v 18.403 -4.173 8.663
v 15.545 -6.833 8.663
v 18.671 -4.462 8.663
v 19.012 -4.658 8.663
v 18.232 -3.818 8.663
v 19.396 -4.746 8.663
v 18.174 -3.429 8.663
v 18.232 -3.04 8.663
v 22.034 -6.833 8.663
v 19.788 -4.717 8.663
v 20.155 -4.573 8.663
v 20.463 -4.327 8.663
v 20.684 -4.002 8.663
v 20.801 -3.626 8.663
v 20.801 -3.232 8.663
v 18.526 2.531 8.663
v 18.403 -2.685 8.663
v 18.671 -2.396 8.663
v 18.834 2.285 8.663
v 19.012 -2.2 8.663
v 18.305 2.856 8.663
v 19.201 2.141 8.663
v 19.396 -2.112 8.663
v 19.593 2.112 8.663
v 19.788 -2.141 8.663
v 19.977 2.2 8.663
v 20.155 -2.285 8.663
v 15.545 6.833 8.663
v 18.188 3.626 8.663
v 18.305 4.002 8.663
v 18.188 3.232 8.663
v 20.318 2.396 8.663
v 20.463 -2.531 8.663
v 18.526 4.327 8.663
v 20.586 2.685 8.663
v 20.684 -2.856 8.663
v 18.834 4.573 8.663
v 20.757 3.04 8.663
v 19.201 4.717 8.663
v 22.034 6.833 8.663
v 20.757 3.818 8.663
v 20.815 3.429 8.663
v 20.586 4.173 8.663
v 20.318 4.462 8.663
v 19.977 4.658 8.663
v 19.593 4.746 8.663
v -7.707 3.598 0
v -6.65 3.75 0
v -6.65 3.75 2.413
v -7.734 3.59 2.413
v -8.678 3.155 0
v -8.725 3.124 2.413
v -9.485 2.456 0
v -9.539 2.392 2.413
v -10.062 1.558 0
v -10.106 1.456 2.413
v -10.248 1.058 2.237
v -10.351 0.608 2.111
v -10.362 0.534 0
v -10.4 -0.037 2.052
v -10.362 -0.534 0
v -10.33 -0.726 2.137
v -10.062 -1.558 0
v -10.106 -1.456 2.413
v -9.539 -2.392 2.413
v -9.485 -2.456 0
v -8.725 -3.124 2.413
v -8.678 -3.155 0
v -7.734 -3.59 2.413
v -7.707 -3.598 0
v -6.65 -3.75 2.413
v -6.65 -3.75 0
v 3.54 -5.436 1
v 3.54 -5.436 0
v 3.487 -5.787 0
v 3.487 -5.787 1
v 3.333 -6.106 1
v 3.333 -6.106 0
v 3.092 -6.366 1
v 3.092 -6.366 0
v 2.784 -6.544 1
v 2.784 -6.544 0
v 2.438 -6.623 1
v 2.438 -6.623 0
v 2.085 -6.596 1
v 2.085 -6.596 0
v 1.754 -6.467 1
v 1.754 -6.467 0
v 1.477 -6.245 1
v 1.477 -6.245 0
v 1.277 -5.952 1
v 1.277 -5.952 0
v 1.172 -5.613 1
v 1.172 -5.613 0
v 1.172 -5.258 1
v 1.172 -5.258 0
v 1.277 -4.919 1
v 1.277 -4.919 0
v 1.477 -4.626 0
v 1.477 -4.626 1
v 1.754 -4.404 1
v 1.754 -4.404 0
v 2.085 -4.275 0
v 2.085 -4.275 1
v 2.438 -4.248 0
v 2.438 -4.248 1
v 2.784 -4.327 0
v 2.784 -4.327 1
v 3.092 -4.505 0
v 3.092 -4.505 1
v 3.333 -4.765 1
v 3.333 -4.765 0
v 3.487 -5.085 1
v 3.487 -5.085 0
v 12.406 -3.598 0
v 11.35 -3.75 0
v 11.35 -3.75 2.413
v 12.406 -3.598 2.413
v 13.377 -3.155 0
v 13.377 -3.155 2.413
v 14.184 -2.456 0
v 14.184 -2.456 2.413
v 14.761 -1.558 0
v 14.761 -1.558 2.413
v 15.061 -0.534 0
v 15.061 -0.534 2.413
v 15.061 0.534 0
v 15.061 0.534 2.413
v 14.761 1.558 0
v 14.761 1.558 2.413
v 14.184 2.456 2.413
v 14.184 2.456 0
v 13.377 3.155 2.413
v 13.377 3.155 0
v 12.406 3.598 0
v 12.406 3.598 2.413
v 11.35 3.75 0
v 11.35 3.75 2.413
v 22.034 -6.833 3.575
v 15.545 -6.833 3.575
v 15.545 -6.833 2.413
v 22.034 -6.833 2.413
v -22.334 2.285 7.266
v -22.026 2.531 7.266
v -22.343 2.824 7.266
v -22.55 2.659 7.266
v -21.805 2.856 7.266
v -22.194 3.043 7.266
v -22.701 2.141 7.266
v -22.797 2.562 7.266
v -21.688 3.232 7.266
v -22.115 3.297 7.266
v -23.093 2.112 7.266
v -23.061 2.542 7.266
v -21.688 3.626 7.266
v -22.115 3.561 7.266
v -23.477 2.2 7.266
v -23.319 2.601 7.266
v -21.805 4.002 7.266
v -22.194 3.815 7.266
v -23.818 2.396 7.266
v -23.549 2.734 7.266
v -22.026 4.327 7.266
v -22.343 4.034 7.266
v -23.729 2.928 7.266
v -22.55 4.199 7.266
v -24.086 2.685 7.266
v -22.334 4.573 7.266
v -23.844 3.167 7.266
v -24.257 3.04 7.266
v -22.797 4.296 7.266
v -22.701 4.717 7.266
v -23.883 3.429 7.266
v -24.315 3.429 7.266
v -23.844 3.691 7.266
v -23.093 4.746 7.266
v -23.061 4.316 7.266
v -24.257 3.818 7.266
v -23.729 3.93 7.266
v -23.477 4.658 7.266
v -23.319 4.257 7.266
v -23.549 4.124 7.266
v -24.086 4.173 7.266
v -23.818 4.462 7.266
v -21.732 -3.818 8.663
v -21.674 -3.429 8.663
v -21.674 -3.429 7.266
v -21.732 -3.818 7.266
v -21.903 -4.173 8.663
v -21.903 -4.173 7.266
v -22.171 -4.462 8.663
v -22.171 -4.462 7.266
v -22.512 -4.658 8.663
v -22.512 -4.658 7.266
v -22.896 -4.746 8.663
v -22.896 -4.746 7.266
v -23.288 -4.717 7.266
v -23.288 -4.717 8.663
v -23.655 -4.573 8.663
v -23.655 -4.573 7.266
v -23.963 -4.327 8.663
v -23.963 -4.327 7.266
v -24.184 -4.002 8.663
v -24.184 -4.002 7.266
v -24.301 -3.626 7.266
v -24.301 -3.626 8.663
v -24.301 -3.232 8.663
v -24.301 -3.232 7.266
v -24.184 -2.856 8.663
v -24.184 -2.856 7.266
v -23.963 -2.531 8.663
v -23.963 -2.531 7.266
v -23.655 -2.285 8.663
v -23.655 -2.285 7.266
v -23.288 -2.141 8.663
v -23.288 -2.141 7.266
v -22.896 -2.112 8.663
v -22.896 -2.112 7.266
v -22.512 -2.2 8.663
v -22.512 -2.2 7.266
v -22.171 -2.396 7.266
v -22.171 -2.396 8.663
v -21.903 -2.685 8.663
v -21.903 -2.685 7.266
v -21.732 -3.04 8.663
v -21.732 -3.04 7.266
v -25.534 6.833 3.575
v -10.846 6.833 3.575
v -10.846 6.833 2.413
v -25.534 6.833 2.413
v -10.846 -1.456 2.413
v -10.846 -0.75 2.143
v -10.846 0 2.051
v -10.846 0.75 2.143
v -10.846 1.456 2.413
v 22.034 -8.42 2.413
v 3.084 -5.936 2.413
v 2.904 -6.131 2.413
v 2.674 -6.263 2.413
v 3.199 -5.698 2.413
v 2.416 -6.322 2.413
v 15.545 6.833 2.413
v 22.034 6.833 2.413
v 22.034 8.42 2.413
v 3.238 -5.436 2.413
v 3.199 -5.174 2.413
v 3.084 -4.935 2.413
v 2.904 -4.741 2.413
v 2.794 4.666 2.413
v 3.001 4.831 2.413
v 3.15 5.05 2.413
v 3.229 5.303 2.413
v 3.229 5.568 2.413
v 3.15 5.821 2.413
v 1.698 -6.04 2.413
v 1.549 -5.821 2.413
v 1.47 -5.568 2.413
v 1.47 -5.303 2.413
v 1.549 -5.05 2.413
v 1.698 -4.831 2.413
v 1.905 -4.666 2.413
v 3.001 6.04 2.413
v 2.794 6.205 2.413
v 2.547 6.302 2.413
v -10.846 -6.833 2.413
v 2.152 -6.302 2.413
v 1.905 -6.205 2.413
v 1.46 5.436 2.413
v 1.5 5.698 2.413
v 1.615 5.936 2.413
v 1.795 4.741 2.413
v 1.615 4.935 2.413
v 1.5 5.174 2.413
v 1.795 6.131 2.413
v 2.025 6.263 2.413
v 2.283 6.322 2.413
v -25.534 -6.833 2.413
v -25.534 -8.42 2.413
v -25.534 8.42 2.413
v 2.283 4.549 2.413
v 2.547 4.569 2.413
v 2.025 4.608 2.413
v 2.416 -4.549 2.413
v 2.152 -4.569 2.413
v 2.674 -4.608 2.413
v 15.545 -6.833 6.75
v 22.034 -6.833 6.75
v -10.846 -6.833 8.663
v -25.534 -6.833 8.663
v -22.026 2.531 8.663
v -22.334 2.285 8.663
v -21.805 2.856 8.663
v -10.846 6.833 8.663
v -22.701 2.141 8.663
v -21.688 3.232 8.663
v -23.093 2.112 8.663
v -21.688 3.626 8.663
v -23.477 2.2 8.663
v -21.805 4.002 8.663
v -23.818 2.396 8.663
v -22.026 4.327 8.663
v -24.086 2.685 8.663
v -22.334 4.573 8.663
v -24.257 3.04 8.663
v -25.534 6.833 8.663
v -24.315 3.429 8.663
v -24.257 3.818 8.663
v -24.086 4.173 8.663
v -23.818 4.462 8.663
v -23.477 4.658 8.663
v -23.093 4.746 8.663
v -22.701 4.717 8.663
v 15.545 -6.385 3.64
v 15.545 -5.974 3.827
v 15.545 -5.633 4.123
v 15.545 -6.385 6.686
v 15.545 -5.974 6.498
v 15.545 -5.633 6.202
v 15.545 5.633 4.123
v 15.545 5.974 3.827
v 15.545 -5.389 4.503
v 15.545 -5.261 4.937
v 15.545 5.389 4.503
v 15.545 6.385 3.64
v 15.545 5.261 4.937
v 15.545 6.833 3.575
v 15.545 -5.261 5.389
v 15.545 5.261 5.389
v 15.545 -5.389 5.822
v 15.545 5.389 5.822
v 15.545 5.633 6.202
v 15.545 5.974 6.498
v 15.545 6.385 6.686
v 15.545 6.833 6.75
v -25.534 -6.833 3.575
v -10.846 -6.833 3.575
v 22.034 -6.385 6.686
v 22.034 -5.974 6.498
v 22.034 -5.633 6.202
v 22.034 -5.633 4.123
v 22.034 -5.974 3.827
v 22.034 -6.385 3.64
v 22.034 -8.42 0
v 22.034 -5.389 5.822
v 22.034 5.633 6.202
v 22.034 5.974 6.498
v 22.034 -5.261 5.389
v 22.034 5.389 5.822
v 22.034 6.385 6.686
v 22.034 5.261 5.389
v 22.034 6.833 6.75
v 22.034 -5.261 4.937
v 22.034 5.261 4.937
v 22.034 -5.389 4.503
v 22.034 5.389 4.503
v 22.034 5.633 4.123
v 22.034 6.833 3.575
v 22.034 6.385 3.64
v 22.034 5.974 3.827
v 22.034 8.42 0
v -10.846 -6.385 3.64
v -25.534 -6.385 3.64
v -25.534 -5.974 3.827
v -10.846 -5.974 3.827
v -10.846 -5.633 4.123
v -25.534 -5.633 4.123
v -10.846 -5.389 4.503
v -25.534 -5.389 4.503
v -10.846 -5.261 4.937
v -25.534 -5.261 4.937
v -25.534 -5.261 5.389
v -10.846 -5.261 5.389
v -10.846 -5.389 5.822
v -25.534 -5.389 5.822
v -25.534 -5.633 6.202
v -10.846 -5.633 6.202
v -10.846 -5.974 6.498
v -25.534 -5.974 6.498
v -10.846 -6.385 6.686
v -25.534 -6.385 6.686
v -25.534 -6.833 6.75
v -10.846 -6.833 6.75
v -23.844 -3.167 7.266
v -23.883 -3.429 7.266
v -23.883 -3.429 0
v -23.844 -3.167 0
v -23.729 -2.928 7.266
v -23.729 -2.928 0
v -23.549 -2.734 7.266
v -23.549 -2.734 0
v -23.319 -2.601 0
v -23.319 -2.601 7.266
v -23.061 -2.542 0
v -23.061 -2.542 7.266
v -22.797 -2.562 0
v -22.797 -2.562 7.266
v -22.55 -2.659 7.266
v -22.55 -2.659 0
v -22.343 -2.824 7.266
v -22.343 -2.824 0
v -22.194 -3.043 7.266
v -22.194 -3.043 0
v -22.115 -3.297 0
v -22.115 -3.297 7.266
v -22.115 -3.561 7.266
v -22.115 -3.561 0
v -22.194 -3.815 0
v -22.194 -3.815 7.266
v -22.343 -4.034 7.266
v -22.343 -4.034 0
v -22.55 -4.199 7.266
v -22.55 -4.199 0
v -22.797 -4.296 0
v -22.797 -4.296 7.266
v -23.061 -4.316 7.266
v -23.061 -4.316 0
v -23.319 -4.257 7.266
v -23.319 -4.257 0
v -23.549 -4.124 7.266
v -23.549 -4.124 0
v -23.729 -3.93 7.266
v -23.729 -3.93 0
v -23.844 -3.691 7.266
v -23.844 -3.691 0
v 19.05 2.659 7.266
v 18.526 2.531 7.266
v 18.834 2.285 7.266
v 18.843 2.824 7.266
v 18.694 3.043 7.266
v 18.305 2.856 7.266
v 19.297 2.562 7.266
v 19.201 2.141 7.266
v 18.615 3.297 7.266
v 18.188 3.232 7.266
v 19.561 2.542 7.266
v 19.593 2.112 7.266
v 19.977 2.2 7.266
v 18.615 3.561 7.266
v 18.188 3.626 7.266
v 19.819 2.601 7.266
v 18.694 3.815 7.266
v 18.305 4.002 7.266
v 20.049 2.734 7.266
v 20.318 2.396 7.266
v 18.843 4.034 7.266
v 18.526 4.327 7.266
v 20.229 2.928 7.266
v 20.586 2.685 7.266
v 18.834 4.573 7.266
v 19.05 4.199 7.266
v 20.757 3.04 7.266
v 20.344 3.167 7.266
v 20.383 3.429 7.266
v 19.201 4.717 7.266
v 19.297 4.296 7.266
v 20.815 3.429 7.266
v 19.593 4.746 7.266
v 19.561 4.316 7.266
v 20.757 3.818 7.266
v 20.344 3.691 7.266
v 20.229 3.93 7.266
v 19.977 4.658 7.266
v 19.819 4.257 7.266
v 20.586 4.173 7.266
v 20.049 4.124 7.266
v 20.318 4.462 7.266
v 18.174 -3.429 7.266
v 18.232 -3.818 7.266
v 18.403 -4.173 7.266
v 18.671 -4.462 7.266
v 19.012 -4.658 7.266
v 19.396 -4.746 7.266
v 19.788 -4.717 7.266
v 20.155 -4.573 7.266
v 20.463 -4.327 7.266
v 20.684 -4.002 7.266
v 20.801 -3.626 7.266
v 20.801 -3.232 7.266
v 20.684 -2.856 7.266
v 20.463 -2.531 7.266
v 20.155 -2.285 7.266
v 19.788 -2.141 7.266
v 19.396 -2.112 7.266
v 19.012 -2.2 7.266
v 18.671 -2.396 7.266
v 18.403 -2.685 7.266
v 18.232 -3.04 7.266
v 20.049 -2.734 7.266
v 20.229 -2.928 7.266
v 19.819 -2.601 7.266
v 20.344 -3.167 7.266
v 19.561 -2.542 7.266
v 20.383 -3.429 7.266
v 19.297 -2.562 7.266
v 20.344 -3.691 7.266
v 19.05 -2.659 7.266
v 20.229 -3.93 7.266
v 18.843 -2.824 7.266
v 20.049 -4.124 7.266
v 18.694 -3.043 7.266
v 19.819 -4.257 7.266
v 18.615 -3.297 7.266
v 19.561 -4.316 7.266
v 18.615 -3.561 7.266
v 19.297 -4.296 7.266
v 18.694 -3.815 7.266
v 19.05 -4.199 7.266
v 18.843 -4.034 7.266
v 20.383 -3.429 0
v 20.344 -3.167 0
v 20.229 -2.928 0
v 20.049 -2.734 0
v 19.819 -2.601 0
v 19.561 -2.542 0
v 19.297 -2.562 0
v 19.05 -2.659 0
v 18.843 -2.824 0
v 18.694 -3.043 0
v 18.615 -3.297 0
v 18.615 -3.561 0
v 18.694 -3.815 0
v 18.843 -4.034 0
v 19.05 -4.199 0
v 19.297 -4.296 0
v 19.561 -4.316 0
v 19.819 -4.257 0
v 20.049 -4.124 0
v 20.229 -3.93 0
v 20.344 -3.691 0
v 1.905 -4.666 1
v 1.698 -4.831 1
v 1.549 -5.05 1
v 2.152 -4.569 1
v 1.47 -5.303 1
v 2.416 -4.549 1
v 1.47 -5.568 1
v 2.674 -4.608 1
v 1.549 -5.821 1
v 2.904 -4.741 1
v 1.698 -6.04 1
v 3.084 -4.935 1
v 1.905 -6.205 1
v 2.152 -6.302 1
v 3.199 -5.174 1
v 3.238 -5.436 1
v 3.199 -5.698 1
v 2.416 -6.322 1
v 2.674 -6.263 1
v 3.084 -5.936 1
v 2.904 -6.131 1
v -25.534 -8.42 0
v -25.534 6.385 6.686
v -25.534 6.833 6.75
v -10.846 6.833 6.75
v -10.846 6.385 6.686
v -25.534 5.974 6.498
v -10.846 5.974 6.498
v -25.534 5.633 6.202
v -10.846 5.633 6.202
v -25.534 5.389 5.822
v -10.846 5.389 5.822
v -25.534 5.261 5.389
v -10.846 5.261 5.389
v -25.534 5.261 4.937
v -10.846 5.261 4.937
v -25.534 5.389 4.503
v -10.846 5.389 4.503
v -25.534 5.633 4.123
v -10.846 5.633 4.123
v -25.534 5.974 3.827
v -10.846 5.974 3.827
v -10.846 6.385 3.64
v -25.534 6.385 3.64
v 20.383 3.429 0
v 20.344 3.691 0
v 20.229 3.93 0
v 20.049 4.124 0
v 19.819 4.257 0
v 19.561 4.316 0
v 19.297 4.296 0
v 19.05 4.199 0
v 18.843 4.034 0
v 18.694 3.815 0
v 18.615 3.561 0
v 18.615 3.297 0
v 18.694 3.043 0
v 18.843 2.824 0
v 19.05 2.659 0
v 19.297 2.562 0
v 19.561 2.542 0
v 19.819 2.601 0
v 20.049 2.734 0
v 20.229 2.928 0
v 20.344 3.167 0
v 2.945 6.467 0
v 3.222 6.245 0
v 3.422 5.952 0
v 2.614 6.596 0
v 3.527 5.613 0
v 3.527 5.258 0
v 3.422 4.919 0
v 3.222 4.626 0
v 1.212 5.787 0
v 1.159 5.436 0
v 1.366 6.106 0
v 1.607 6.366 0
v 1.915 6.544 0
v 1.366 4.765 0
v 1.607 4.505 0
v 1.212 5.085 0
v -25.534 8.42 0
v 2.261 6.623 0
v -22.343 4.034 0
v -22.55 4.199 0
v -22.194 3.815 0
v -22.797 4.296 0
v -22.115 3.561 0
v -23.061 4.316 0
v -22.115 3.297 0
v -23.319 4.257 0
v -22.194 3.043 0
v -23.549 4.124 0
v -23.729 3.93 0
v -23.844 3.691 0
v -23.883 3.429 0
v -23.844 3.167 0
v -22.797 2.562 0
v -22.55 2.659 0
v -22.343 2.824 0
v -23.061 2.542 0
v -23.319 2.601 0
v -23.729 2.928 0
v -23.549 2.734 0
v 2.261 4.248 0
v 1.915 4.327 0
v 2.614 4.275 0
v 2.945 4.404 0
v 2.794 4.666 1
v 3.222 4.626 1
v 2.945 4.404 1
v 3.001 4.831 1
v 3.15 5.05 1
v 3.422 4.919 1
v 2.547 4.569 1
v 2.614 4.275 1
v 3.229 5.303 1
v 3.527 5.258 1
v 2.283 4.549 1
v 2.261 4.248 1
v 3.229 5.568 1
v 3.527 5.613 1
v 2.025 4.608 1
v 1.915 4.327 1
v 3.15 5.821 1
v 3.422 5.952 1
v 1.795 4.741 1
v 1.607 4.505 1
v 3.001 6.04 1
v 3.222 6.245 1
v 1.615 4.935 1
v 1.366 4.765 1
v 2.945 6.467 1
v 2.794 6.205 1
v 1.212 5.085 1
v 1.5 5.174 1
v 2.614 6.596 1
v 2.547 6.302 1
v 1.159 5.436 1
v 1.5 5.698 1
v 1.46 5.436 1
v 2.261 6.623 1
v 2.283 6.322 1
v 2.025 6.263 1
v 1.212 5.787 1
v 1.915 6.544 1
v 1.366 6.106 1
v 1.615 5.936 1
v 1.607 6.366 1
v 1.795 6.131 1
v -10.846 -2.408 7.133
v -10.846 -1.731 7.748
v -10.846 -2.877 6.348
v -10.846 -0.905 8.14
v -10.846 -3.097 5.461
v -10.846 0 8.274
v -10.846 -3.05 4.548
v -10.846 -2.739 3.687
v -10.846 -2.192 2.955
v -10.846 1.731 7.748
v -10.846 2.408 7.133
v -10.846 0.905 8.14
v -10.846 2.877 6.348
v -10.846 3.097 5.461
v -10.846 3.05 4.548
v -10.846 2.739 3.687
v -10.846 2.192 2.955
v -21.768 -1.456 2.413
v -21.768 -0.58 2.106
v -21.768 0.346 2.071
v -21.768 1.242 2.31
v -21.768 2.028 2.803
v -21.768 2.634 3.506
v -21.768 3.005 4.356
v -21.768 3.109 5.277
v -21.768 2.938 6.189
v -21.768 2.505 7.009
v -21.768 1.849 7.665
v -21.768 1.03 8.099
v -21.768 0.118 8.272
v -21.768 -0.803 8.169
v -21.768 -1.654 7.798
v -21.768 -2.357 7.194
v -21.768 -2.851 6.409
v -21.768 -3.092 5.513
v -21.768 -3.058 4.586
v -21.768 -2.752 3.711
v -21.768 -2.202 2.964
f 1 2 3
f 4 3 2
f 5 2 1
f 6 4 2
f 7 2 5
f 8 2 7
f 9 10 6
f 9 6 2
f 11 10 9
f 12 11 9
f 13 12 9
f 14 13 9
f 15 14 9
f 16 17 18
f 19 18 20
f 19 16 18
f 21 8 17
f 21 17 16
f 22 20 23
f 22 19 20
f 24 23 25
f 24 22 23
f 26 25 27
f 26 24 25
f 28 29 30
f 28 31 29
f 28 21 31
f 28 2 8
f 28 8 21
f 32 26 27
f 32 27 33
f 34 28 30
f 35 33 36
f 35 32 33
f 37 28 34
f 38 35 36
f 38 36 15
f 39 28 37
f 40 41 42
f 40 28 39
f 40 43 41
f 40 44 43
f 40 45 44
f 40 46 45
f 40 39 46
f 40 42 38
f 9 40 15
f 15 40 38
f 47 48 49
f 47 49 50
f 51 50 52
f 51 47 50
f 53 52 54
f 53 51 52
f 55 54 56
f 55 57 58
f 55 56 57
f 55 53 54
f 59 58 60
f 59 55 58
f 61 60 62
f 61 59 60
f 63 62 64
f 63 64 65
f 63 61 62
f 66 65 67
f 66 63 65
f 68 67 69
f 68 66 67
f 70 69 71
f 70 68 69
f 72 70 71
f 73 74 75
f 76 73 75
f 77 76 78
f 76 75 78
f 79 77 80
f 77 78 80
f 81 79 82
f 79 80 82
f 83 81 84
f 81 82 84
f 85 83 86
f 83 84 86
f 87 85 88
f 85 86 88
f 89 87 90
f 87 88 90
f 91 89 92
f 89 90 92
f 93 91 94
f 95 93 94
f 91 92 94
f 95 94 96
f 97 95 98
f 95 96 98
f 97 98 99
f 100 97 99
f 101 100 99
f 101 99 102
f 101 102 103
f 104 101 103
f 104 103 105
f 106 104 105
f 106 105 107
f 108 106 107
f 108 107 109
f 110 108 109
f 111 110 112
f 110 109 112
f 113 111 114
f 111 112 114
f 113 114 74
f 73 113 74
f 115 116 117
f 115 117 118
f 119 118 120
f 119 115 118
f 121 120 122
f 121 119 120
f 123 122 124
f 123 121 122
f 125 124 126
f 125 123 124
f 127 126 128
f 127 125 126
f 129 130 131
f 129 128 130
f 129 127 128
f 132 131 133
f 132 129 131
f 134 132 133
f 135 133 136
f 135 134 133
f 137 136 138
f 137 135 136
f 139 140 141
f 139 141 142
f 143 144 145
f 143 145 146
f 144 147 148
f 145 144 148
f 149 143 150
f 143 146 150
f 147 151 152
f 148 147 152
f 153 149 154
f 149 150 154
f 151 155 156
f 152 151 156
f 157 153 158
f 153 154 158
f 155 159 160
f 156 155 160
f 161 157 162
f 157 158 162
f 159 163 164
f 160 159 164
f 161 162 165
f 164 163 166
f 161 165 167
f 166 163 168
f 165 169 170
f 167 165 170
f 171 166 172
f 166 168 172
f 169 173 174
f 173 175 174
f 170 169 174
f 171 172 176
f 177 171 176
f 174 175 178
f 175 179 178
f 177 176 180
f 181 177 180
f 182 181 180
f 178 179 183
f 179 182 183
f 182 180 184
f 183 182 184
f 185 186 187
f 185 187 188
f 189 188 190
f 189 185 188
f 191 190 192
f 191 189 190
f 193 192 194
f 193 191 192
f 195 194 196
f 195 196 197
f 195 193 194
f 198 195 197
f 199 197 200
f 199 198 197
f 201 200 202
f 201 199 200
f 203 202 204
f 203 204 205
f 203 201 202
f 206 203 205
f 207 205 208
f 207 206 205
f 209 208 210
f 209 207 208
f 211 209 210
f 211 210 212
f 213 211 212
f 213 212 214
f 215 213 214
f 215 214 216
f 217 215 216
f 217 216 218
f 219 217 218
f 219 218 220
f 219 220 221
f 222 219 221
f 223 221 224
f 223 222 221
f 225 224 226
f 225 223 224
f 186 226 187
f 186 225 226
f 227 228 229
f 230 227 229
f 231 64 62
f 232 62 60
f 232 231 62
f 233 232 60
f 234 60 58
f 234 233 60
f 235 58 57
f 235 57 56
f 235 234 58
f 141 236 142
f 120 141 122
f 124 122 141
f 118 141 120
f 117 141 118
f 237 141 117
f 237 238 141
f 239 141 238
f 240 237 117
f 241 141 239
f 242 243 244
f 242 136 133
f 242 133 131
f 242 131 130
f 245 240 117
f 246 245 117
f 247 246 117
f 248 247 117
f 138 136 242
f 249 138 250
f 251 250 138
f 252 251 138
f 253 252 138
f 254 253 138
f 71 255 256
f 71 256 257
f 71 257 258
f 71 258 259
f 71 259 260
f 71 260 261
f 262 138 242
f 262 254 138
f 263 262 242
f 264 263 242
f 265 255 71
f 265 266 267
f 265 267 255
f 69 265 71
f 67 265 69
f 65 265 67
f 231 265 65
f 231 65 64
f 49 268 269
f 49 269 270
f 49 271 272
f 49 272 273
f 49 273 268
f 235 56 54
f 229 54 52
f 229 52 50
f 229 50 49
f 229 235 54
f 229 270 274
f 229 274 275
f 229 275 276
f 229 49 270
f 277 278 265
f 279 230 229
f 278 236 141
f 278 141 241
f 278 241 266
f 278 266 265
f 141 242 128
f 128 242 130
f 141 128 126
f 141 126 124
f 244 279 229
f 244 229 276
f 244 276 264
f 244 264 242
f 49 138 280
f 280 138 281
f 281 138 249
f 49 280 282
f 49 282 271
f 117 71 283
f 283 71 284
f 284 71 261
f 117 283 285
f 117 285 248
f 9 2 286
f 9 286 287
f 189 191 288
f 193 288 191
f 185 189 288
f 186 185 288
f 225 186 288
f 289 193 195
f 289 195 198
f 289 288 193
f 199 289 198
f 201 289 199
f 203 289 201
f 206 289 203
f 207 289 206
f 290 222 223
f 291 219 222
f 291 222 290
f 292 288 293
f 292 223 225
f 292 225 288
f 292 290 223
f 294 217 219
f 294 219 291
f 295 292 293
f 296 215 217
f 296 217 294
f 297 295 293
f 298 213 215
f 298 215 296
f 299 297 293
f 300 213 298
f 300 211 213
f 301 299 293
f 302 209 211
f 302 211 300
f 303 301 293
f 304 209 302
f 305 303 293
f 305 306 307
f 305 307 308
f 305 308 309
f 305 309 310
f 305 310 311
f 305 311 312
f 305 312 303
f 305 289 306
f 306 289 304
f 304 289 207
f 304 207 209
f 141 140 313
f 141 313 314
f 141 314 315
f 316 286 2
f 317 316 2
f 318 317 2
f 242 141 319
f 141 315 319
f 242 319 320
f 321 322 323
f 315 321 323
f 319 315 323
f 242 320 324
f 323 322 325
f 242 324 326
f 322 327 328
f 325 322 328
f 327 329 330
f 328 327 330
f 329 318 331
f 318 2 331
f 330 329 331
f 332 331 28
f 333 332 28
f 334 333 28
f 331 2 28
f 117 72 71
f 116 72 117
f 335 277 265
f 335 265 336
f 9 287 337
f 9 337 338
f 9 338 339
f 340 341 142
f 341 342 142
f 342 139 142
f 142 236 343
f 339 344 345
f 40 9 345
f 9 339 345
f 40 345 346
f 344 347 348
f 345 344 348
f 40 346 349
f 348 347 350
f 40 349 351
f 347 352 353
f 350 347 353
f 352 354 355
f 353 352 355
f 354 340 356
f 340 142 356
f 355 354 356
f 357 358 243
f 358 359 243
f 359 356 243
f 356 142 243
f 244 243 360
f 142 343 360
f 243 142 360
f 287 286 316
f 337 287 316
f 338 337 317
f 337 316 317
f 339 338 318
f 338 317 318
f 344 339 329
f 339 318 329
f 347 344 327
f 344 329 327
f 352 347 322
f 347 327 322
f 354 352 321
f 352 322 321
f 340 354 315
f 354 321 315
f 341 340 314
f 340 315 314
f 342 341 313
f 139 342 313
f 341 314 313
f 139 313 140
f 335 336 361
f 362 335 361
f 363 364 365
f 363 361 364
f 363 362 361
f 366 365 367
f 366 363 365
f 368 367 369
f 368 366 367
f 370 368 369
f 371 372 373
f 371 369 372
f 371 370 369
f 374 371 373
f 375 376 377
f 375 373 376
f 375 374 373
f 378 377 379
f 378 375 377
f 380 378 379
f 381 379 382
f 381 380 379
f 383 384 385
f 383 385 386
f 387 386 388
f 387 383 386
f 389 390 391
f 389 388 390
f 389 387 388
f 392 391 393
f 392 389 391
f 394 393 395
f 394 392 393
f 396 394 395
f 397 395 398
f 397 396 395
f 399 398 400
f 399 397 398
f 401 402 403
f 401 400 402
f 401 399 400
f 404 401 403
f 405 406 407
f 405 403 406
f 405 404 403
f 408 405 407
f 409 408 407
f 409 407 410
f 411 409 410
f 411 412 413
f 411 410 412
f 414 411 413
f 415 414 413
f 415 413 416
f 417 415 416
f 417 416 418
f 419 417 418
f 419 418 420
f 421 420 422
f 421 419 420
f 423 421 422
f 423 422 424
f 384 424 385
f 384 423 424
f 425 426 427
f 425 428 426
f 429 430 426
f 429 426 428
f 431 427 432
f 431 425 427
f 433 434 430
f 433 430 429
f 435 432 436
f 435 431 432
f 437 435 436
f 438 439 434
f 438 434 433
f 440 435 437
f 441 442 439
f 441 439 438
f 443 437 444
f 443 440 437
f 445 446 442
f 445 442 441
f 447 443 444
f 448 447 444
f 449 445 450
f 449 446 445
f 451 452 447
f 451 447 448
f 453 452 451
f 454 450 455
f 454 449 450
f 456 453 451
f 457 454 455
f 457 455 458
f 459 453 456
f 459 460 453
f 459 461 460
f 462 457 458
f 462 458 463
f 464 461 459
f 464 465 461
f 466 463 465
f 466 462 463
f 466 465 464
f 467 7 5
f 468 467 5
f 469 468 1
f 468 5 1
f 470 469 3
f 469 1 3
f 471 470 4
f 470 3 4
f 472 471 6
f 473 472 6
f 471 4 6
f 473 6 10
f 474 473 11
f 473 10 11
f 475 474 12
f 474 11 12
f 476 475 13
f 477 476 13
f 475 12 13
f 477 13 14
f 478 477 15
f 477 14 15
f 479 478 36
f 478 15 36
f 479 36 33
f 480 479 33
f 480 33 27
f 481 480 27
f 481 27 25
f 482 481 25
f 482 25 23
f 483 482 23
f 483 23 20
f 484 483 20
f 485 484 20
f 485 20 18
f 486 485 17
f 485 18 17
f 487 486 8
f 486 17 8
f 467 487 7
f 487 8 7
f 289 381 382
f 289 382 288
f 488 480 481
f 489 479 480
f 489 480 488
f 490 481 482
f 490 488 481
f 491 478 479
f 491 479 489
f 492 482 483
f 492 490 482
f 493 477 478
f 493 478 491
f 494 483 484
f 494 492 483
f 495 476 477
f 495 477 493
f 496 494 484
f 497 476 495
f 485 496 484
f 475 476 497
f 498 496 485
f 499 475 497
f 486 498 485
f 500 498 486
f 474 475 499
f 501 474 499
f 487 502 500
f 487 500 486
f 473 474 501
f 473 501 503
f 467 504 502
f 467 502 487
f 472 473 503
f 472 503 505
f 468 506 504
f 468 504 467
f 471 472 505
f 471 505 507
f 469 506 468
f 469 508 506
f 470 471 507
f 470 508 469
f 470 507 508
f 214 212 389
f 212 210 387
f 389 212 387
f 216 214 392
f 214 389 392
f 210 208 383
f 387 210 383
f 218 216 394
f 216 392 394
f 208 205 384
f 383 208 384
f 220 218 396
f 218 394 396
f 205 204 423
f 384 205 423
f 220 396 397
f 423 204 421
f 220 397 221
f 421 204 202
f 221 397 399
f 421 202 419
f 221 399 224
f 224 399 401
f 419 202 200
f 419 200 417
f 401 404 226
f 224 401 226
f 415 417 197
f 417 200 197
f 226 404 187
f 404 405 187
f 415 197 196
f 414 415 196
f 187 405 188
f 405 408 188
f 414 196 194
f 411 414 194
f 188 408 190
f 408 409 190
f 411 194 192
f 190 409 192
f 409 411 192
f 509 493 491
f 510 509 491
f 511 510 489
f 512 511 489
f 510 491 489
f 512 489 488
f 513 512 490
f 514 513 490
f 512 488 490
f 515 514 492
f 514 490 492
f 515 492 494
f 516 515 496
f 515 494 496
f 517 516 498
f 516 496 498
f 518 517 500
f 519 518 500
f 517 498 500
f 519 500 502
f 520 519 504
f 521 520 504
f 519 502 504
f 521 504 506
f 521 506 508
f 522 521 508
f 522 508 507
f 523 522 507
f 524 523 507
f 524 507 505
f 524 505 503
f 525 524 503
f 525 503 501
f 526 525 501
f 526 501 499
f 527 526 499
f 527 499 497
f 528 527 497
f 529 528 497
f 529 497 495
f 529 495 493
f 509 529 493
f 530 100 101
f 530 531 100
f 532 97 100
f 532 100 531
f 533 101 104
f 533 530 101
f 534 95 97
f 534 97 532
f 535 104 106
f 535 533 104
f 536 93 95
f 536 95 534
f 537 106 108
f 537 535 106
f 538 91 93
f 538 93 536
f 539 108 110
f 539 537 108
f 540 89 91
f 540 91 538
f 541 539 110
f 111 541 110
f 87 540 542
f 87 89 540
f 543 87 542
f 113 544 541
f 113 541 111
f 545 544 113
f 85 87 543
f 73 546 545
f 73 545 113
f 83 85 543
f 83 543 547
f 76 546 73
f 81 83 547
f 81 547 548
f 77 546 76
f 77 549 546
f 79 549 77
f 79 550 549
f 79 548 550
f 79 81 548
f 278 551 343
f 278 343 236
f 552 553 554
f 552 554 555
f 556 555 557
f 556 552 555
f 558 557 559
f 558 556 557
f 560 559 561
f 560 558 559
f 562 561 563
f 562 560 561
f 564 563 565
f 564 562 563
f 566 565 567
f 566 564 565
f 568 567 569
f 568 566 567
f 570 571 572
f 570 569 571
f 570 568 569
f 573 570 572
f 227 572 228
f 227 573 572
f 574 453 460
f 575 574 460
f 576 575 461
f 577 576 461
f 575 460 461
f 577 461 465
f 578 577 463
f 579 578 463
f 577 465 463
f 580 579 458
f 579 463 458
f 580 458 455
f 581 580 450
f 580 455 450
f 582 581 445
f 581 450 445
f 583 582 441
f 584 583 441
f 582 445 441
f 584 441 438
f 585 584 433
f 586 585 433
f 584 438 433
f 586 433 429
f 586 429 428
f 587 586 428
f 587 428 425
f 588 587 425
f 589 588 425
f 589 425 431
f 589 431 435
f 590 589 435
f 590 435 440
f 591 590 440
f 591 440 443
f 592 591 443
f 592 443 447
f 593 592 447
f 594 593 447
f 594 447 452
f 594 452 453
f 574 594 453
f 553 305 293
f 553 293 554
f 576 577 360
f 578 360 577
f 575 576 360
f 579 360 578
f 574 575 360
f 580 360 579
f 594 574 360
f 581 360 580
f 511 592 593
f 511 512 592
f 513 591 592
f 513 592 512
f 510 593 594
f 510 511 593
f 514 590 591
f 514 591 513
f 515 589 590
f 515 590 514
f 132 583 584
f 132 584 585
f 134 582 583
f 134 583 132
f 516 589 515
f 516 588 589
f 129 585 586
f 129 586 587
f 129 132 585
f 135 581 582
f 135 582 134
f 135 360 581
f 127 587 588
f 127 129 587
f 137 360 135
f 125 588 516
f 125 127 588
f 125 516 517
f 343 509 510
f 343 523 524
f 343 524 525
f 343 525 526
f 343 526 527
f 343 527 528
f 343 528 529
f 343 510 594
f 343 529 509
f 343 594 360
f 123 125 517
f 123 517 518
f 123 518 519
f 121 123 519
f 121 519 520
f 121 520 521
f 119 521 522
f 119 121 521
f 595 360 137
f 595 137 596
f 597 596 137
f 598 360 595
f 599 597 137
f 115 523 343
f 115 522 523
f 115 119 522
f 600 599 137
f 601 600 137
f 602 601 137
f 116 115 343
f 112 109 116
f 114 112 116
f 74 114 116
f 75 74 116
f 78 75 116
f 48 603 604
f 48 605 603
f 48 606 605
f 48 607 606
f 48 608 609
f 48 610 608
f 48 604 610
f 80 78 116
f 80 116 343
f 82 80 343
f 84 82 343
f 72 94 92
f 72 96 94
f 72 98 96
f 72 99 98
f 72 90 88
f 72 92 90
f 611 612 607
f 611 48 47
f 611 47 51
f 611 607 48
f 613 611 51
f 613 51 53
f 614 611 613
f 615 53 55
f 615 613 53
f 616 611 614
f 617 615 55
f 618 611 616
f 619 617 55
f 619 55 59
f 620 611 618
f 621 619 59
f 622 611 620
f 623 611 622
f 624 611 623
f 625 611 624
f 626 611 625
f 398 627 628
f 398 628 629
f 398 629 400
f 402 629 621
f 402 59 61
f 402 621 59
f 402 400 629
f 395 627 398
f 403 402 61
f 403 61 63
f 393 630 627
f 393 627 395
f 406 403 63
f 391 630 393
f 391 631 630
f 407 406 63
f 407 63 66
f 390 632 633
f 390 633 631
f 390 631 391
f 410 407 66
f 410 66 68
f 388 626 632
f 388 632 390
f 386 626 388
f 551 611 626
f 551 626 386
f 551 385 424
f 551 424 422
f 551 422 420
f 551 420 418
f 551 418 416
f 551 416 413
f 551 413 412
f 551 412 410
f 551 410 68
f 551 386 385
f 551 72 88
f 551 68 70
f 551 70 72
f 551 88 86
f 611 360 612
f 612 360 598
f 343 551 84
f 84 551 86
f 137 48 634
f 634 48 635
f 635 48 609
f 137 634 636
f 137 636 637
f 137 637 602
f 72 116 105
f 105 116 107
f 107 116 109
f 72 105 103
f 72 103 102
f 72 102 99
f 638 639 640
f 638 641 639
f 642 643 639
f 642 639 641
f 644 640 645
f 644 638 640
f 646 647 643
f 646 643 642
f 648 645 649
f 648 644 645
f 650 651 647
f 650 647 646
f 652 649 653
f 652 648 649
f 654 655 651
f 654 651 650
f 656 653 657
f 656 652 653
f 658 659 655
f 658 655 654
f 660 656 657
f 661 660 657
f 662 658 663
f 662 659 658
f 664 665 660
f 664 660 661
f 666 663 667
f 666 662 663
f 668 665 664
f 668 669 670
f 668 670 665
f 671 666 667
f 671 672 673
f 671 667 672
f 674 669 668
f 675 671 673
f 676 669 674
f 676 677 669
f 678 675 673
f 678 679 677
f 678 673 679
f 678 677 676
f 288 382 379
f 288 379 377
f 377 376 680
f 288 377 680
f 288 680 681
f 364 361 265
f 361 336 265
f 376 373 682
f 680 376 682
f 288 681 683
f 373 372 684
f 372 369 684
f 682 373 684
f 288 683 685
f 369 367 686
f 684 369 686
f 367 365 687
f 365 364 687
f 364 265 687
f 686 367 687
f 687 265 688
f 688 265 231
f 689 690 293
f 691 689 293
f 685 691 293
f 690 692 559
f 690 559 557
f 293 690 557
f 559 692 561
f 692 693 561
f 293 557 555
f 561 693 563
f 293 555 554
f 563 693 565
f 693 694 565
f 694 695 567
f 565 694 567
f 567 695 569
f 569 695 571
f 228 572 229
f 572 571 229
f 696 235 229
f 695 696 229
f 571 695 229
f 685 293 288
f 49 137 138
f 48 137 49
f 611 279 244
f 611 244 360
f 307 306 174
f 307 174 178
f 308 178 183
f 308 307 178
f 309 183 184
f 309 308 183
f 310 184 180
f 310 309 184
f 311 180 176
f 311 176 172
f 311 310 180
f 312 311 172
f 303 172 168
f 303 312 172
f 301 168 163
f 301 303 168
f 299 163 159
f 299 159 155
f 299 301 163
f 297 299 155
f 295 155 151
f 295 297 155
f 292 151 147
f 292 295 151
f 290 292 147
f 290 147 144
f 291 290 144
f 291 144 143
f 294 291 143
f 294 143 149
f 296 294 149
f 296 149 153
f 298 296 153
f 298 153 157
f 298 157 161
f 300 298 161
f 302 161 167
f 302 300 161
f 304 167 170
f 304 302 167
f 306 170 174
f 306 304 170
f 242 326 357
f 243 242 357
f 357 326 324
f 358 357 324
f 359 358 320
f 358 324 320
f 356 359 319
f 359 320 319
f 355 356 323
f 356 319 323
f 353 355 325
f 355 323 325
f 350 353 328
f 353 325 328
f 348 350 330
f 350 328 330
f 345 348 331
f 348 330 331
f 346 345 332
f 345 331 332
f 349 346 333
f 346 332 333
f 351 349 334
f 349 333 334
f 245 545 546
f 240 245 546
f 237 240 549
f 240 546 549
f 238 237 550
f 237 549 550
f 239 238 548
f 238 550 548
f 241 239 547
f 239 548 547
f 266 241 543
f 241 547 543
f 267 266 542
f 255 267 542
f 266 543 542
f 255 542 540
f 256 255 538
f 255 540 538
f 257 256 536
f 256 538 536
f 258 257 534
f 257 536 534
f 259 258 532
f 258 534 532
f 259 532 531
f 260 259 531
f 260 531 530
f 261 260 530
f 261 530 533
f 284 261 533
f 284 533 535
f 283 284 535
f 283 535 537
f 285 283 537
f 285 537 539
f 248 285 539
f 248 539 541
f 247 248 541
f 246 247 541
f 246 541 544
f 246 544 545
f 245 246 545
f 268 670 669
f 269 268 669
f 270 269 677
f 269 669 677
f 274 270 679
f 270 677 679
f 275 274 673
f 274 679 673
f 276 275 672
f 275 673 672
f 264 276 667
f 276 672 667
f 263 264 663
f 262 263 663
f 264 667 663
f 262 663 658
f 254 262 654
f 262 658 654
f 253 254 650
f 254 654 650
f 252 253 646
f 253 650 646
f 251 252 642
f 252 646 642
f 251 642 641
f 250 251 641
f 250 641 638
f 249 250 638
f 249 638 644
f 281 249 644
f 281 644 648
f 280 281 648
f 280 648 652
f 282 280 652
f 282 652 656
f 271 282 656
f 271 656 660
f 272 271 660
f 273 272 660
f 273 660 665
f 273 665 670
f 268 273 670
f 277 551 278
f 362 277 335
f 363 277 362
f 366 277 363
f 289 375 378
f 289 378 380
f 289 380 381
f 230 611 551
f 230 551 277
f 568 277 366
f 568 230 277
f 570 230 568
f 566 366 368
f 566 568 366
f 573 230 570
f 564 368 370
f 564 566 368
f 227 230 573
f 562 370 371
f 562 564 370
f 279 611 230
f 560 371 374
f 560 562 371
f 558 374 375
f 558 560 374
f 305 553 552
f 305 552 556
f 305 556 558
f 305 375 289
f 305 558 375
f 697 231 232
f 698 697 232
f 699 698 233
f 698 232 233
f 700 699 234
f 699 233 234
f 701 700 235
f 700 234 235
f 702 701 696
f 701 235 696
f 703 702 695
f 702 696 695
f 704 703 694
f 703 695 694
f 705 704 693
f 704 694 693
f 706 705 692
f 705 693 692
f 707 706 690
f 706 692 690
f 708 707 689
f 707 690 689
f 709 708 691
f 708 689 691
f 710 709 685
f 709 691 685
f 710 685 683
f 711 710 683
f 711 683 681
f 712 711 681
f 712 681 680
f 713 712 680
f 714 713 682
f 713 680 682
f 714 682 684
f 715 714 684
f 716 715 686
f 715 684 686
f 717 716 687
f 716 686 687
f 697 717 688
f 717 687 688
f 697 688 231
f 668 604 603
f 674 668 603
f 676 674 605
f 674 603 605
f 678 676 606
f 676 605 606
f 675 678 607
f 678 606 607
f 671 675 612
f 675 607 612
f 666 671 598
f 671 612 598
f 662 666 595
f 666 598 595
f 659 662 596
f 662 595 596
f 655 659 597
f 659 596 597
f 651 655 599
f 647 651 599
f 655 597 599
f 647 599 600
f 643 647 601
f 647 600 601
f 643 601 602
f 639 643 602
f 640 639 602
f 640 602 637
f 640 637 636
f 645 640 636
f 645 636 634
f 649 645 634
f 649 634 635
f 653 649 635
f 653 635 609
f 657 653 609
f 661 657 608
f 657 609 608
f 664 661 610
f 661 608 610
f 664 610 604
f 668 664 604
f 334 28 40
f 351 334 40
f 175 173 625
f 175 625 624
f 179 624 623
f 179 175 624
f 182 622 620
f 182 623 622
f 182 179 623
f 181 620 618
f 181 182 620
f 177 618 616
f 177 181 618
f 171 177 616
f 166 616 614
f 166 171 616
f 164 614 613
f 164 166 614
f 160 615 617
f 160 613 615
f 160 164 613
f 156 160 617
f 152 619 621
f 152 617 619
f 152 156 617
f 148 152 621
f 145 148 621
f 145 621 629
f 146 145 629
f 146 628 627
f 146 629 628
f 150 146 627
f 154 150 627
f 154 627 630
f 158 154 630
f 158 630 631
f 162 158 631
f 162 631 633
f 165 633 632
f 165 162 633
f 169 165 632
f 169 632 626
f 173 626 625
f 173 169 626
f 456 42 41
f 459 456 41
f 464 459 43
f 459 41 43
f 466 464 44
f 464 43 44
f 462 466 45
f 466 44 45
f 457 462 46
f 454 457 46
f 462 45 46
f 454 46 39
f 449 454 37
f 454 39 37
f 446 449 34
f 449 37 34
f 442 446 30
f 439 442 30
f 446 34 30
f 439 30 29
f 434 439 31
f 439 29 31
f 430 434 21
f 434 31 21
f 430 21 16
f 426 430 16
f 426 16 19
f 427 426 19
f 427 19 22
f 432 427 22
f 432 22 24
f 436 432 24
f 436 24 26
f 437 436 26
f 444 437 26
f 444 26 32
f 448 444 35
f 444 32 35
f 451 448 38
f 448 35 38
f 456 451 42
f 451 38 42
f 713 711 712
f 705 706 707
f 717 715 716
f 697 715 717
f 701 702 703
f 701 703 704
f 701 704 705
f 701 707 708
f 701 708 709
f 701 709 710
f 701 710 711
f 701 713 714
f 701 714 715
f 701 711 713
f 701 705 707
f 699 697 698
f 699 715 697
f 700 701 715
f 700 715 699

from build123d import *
from build123d.topology import SkipClean

# Parameters (mm, degrees)
SKETCH1_W                       = 44.069
SKETCH1_H                       = 16.8402
BOSS_EXTRUDE1_DEPTH             = 7.1628
SKETCH2_W                       = 26.3906
SKETCH2_H                       = 16.8402
CUT_EXTRUDE1_DEPTH              = 4.75
SKETCH4_W                       = 11.1887
SKETCH4_H                       = 1.5875
SKETCH4_W_2                     = 6.4897
CUT_EXTRUDE9_DEPTH              = 4.75
SKETCH5_R                       = 1.5875
CUT_EXTRUDE10_DEPTH             = 46.43435428
SKETCH14_W                      = 11.1887
SKETCH14_H                      = 13.6652
SKETCH14_W_2                    = 6.4897
BOSS_EXTRUDE3_DEPTH             = 1.5
SKETCH6_R                       = 0.889
CUT_EXTRUDE11_DEPTH             = 26.128895282
SKETCH7_R                       = 1.3208
CUT_EXTRUDE12_DEPTH             = 1.397
SKETCH9_R                       = 0.889
CUT_EXTRUDE13_DEPTH             = 26.128895282
SKETCH10_R                      = 1.190625
CUT_EXTRUDE14_DEPTH             = 1
CUT_EXTRUDE15_DEPTH             = 26.128895282
SKETCH12_R                      = 3.1115
CUT_EXTRUDE16_DEPTH             = 10.922
CUT_EXTRUDE16_DIRECTION_2_REACH = 37.029
BOSS_EXTRUDE4_START             = 3.5
BOSS_EXTRUDE4_DEPTH             = 3.5


with BuildPart() as part:
    # Sketch1 → Boss-Extrude1 (new body)
    with BuildSketch(Plane.XY):
        Rectangle(SKETCH1_W, SKETCH1_H)
    extrude(amount=BOSS_EXTRUDE1_DEPTH)

    # Sketch2 → Cut-Extrude1 (cut)
    with BuildSketch(Plane.XY.offset(7.1628)):
        with Locations((2.3495, 0)):
            Rectangle(SKETCH2_W, SKETCH2_H)
    extrude(amount=-CUT_EXTRUDE1_DEPTH, mode=Mode.SUBTRACT)

    # Sketch4 → Cut-Extrude9 (cut)
    with BuildSketch(Plane.XY.offset(7.1628)):
        with Locations((-16.44015, -7.62635)):
            Rectangle(SKETCH4_W, SKETCH4_H)
        with Locations((-16.44015, 7.62635)):
            Rectangle(SKETCH4_W, SKETCH4_H)
        with Locations((18.78965, -7.62635)):
            Rectangle(SKETCH4_W_2, SKETCH4_H)
        with Locations((18.78965, 7.62635)):
            Rectangle(SKETCH4_W_2, SKETCH4_H)
    extrude(amount=-CUT_EXTRUDE9_DEPTH, mode=Mode.SUBTRACT)

    # Sketch5 → Cut-Extrude10 (cut, through all)
    with BuildSketch(Plane.ZY.offset(22.0345)):
        with Locations((5.1628, -6.8326)):
            Circle(SKETCH5_R)
        with Locations((5.1628, 6.8326)):
            Circle(SKETCH5_R)
    extrude(amount=-CUT_EXTRUDE10_DEPTH, mode=Mode.SUBTRACT)

    # Sketch14 → Boss-Extrude3 (add)
    with BuildSketch(Plane.XY.offset(7.1628)):
        with Locations((-16.44015, 0)):
            Rectangle(SKETCH14_W, SKETCH14_H)
        with Locations((18.78965, 0)):
            Rectangle(SKETCH14_W_2, SKETCH14_H)
    extrude(amount=BOSS_EXTRUDE3_DEPTH)

    # Sketch6 → Cut-Extrude11 (cut, through all)
    with BuildSketch(Plane.XY.offset(8.6628)):
        with Locations((19.4945, 3.429)):
            Circle(SKETCH6_R)
        with Locations((19.4945, -3.429)):
            Circle(SKETCH6_R)
    cut_extrude11 = extrude(amount=-CUT_EXTRUDE11_DEPTH, mode=Mode.SUBTRACT)

    # Sketch7 → Cut-Extrude12 (cut)
    with BuildSketch(Plane.XY.offset(8.6628)):
        with Locations((19.4945, 3.429)):
            Circle(SKETCH7_R)
        with Locations(Location((19.4945, -3.429, 0), (0, 0, 180))):
            Circle(SKETCH7_R)
    cut_extrude12 = extrude(amount=-CUT_EXTRUDE12_DEPTH, mode=Mode.SUBTRACT)

    # Sketch9 → Cut-Extrude13 (cut, through all)
    with BuildSketch(Plane(origin=(0, 0, 0), x_dir=(-1, 0, 0), z_dir=(0, 0, -1))):
        with Locations((-2.3495, 5.4356)):
            Circle(SKETCH9_R)
        with Locations(Location((-2.3495, -5.4356, 0), (0, 0, 180))):
            Circle(SKETCH9_R)
    extrude(amount=-CUT_EXTRUDE13_DEPTH, mode=Mode.SUBTRACT)

    # Sketch10 → Cut-Extrude14 (cut)
    with BuildSketch(Plane(origin=(0, 0, 0), x_dir=(-1, 0, 0), z_dir=(0, 0, -1))):
        with Locations((-2.3495, 5.4356)):
            Circle(SKETCH10_R)
        with Locations(Location((-2.3495, -5.4356, 0), (0, 0, 180))):
            Circle(SKETCH10_R)
    extrude(amount=-CUT_EXTRUDE14_DEPTH, mode=Mode.SUBTRACT)

    # Sketch11 → Cut-Extrude15 (cut, through all)
    with BuildSketch(Plane(origin=(0, 0, 0), x_dir=(-1, 0, 0), z_dir=(0, 0, -1))):
        with BuildLine():
            Line((-11.3495, 3.75), (6.6505, 3.75))
            ThreePointArc((6.6505, 3.75), (10.4005, 0), (6.6505, -3.75))
            Line((6.6505, -3.75), (-11.3495, -3.75))
            ThreePointArc((-11.3495, -3.75), (-15.0995, 0), (-11.3495, 3.75))
        make_face()
    extrude(amount=-CUT_EXTRUDE15_DEPTH, mode=Mode.SUBTRACT)

    # Sketch12 → Cut-Extrude16 (cut)
    with BuildSketch(Plane(origin=(-10.8458, 0, 0), x_dir=(0, 0, -1), z_dir=(1, 0, 0))):
        with Locations(Location((-5.1628, 0, 0), (0, 0, 332.106408593))):
            Circle(SKETCH12_R)
    extrude(amount=-CUT_EXTRUDE16_DEPTH, mode=Mode.SUBTRACT)

    # Sketch12 → Cut-Extrude16 direction 2 (cut, up to next)
    with BuildSketch(Plane(origin=(-10.8458, 0, 0), x_dir=(0, 0, -1), z_dir=(1, 0, 0)), mode=Mode.PRIVATE) as cut_extrude16_direction_2_sk1:
        with Locations(Location((-5.1628, 0, 0), (0, 0, 332.106408593))):
            Circle(SKETCH12_R)
    cut_extrude16_direction_2_tool1 = extrude(cut_extrude16_direction_2_sk1.sketch, amount=CUT_EXTRUDE16_DIRECTION_2_REACH, mode=Mode.PRIVATE) & part.part
    add(cut_extrude16_direction_2_tool1.solids().sort_by_distance((-10.8458, 0, 5.1628))[0], mode=Mode.SUBTRACT)

    # Sketch15 → Boss-Extrude4 (add)
    with SkipClean():  # the faces are left unmerged after this step: merging them gives an invalid solid
        with BuildSketch(Plane.ZY.offset(22.0345).offset(BOSS_EXTRUDE4_START)):
            with BuildLine():
                Line((8.6628, 6.8326), (6.7503, 6.8326))
                ThreePointArc((6.7503, 6.8326), (5.1628, 5.2451), (3.5753, 6.8326))
                Line((3.5753, 6.8326), (2.4128, 6.8326))
                Line((2.4128, 6.8326), (2.4128, 8.4201))
                Line((2.4128, 8.4201), (0, 8.4201))
                Line((0, 8.4201), (0, -8.4201))
                Line((0, -8.4201), (2.4128, -8.4201))
                Line((2.4128, -8.4201), (2.4128, -6.8326))
                Line((2.4128, -6.8326), (3.5753, -6.8326))
                ThreePointArc((3.5753, -6.8326), (5.1628, -5.2451), (6.7503, -6.8326))
                Line((6.7503, -6.8326), (8.6628, -6.8326))
                Line((8.6628, -6.8326), (8.6628, 6.8326))
            make_face()
        extrude(amount=-BOSS_EXTRUDE4_DEPTH)
    add(part.part.scale(1), mode=Mode.REPLACE)  # the faces are merged on a copy

    # Mirror1: Cut-Extrude11, Cut-Extrude12 across plane
    add(cut_extrude11.mirror(Plane(origin=(-1.75, 0, 0), x_dir=(0, 0, 1), z_dir=(1, 0, 0))), mode=Mode.SUBTRACT)
    add(cut_extrude12.mirror(Plane(origin=(-1.75, 0, 0), x_dir=(0, 0, 1), z_dir=(1, 0, 0))), mode=Mode.SUBTRACT)


solid = part.part
